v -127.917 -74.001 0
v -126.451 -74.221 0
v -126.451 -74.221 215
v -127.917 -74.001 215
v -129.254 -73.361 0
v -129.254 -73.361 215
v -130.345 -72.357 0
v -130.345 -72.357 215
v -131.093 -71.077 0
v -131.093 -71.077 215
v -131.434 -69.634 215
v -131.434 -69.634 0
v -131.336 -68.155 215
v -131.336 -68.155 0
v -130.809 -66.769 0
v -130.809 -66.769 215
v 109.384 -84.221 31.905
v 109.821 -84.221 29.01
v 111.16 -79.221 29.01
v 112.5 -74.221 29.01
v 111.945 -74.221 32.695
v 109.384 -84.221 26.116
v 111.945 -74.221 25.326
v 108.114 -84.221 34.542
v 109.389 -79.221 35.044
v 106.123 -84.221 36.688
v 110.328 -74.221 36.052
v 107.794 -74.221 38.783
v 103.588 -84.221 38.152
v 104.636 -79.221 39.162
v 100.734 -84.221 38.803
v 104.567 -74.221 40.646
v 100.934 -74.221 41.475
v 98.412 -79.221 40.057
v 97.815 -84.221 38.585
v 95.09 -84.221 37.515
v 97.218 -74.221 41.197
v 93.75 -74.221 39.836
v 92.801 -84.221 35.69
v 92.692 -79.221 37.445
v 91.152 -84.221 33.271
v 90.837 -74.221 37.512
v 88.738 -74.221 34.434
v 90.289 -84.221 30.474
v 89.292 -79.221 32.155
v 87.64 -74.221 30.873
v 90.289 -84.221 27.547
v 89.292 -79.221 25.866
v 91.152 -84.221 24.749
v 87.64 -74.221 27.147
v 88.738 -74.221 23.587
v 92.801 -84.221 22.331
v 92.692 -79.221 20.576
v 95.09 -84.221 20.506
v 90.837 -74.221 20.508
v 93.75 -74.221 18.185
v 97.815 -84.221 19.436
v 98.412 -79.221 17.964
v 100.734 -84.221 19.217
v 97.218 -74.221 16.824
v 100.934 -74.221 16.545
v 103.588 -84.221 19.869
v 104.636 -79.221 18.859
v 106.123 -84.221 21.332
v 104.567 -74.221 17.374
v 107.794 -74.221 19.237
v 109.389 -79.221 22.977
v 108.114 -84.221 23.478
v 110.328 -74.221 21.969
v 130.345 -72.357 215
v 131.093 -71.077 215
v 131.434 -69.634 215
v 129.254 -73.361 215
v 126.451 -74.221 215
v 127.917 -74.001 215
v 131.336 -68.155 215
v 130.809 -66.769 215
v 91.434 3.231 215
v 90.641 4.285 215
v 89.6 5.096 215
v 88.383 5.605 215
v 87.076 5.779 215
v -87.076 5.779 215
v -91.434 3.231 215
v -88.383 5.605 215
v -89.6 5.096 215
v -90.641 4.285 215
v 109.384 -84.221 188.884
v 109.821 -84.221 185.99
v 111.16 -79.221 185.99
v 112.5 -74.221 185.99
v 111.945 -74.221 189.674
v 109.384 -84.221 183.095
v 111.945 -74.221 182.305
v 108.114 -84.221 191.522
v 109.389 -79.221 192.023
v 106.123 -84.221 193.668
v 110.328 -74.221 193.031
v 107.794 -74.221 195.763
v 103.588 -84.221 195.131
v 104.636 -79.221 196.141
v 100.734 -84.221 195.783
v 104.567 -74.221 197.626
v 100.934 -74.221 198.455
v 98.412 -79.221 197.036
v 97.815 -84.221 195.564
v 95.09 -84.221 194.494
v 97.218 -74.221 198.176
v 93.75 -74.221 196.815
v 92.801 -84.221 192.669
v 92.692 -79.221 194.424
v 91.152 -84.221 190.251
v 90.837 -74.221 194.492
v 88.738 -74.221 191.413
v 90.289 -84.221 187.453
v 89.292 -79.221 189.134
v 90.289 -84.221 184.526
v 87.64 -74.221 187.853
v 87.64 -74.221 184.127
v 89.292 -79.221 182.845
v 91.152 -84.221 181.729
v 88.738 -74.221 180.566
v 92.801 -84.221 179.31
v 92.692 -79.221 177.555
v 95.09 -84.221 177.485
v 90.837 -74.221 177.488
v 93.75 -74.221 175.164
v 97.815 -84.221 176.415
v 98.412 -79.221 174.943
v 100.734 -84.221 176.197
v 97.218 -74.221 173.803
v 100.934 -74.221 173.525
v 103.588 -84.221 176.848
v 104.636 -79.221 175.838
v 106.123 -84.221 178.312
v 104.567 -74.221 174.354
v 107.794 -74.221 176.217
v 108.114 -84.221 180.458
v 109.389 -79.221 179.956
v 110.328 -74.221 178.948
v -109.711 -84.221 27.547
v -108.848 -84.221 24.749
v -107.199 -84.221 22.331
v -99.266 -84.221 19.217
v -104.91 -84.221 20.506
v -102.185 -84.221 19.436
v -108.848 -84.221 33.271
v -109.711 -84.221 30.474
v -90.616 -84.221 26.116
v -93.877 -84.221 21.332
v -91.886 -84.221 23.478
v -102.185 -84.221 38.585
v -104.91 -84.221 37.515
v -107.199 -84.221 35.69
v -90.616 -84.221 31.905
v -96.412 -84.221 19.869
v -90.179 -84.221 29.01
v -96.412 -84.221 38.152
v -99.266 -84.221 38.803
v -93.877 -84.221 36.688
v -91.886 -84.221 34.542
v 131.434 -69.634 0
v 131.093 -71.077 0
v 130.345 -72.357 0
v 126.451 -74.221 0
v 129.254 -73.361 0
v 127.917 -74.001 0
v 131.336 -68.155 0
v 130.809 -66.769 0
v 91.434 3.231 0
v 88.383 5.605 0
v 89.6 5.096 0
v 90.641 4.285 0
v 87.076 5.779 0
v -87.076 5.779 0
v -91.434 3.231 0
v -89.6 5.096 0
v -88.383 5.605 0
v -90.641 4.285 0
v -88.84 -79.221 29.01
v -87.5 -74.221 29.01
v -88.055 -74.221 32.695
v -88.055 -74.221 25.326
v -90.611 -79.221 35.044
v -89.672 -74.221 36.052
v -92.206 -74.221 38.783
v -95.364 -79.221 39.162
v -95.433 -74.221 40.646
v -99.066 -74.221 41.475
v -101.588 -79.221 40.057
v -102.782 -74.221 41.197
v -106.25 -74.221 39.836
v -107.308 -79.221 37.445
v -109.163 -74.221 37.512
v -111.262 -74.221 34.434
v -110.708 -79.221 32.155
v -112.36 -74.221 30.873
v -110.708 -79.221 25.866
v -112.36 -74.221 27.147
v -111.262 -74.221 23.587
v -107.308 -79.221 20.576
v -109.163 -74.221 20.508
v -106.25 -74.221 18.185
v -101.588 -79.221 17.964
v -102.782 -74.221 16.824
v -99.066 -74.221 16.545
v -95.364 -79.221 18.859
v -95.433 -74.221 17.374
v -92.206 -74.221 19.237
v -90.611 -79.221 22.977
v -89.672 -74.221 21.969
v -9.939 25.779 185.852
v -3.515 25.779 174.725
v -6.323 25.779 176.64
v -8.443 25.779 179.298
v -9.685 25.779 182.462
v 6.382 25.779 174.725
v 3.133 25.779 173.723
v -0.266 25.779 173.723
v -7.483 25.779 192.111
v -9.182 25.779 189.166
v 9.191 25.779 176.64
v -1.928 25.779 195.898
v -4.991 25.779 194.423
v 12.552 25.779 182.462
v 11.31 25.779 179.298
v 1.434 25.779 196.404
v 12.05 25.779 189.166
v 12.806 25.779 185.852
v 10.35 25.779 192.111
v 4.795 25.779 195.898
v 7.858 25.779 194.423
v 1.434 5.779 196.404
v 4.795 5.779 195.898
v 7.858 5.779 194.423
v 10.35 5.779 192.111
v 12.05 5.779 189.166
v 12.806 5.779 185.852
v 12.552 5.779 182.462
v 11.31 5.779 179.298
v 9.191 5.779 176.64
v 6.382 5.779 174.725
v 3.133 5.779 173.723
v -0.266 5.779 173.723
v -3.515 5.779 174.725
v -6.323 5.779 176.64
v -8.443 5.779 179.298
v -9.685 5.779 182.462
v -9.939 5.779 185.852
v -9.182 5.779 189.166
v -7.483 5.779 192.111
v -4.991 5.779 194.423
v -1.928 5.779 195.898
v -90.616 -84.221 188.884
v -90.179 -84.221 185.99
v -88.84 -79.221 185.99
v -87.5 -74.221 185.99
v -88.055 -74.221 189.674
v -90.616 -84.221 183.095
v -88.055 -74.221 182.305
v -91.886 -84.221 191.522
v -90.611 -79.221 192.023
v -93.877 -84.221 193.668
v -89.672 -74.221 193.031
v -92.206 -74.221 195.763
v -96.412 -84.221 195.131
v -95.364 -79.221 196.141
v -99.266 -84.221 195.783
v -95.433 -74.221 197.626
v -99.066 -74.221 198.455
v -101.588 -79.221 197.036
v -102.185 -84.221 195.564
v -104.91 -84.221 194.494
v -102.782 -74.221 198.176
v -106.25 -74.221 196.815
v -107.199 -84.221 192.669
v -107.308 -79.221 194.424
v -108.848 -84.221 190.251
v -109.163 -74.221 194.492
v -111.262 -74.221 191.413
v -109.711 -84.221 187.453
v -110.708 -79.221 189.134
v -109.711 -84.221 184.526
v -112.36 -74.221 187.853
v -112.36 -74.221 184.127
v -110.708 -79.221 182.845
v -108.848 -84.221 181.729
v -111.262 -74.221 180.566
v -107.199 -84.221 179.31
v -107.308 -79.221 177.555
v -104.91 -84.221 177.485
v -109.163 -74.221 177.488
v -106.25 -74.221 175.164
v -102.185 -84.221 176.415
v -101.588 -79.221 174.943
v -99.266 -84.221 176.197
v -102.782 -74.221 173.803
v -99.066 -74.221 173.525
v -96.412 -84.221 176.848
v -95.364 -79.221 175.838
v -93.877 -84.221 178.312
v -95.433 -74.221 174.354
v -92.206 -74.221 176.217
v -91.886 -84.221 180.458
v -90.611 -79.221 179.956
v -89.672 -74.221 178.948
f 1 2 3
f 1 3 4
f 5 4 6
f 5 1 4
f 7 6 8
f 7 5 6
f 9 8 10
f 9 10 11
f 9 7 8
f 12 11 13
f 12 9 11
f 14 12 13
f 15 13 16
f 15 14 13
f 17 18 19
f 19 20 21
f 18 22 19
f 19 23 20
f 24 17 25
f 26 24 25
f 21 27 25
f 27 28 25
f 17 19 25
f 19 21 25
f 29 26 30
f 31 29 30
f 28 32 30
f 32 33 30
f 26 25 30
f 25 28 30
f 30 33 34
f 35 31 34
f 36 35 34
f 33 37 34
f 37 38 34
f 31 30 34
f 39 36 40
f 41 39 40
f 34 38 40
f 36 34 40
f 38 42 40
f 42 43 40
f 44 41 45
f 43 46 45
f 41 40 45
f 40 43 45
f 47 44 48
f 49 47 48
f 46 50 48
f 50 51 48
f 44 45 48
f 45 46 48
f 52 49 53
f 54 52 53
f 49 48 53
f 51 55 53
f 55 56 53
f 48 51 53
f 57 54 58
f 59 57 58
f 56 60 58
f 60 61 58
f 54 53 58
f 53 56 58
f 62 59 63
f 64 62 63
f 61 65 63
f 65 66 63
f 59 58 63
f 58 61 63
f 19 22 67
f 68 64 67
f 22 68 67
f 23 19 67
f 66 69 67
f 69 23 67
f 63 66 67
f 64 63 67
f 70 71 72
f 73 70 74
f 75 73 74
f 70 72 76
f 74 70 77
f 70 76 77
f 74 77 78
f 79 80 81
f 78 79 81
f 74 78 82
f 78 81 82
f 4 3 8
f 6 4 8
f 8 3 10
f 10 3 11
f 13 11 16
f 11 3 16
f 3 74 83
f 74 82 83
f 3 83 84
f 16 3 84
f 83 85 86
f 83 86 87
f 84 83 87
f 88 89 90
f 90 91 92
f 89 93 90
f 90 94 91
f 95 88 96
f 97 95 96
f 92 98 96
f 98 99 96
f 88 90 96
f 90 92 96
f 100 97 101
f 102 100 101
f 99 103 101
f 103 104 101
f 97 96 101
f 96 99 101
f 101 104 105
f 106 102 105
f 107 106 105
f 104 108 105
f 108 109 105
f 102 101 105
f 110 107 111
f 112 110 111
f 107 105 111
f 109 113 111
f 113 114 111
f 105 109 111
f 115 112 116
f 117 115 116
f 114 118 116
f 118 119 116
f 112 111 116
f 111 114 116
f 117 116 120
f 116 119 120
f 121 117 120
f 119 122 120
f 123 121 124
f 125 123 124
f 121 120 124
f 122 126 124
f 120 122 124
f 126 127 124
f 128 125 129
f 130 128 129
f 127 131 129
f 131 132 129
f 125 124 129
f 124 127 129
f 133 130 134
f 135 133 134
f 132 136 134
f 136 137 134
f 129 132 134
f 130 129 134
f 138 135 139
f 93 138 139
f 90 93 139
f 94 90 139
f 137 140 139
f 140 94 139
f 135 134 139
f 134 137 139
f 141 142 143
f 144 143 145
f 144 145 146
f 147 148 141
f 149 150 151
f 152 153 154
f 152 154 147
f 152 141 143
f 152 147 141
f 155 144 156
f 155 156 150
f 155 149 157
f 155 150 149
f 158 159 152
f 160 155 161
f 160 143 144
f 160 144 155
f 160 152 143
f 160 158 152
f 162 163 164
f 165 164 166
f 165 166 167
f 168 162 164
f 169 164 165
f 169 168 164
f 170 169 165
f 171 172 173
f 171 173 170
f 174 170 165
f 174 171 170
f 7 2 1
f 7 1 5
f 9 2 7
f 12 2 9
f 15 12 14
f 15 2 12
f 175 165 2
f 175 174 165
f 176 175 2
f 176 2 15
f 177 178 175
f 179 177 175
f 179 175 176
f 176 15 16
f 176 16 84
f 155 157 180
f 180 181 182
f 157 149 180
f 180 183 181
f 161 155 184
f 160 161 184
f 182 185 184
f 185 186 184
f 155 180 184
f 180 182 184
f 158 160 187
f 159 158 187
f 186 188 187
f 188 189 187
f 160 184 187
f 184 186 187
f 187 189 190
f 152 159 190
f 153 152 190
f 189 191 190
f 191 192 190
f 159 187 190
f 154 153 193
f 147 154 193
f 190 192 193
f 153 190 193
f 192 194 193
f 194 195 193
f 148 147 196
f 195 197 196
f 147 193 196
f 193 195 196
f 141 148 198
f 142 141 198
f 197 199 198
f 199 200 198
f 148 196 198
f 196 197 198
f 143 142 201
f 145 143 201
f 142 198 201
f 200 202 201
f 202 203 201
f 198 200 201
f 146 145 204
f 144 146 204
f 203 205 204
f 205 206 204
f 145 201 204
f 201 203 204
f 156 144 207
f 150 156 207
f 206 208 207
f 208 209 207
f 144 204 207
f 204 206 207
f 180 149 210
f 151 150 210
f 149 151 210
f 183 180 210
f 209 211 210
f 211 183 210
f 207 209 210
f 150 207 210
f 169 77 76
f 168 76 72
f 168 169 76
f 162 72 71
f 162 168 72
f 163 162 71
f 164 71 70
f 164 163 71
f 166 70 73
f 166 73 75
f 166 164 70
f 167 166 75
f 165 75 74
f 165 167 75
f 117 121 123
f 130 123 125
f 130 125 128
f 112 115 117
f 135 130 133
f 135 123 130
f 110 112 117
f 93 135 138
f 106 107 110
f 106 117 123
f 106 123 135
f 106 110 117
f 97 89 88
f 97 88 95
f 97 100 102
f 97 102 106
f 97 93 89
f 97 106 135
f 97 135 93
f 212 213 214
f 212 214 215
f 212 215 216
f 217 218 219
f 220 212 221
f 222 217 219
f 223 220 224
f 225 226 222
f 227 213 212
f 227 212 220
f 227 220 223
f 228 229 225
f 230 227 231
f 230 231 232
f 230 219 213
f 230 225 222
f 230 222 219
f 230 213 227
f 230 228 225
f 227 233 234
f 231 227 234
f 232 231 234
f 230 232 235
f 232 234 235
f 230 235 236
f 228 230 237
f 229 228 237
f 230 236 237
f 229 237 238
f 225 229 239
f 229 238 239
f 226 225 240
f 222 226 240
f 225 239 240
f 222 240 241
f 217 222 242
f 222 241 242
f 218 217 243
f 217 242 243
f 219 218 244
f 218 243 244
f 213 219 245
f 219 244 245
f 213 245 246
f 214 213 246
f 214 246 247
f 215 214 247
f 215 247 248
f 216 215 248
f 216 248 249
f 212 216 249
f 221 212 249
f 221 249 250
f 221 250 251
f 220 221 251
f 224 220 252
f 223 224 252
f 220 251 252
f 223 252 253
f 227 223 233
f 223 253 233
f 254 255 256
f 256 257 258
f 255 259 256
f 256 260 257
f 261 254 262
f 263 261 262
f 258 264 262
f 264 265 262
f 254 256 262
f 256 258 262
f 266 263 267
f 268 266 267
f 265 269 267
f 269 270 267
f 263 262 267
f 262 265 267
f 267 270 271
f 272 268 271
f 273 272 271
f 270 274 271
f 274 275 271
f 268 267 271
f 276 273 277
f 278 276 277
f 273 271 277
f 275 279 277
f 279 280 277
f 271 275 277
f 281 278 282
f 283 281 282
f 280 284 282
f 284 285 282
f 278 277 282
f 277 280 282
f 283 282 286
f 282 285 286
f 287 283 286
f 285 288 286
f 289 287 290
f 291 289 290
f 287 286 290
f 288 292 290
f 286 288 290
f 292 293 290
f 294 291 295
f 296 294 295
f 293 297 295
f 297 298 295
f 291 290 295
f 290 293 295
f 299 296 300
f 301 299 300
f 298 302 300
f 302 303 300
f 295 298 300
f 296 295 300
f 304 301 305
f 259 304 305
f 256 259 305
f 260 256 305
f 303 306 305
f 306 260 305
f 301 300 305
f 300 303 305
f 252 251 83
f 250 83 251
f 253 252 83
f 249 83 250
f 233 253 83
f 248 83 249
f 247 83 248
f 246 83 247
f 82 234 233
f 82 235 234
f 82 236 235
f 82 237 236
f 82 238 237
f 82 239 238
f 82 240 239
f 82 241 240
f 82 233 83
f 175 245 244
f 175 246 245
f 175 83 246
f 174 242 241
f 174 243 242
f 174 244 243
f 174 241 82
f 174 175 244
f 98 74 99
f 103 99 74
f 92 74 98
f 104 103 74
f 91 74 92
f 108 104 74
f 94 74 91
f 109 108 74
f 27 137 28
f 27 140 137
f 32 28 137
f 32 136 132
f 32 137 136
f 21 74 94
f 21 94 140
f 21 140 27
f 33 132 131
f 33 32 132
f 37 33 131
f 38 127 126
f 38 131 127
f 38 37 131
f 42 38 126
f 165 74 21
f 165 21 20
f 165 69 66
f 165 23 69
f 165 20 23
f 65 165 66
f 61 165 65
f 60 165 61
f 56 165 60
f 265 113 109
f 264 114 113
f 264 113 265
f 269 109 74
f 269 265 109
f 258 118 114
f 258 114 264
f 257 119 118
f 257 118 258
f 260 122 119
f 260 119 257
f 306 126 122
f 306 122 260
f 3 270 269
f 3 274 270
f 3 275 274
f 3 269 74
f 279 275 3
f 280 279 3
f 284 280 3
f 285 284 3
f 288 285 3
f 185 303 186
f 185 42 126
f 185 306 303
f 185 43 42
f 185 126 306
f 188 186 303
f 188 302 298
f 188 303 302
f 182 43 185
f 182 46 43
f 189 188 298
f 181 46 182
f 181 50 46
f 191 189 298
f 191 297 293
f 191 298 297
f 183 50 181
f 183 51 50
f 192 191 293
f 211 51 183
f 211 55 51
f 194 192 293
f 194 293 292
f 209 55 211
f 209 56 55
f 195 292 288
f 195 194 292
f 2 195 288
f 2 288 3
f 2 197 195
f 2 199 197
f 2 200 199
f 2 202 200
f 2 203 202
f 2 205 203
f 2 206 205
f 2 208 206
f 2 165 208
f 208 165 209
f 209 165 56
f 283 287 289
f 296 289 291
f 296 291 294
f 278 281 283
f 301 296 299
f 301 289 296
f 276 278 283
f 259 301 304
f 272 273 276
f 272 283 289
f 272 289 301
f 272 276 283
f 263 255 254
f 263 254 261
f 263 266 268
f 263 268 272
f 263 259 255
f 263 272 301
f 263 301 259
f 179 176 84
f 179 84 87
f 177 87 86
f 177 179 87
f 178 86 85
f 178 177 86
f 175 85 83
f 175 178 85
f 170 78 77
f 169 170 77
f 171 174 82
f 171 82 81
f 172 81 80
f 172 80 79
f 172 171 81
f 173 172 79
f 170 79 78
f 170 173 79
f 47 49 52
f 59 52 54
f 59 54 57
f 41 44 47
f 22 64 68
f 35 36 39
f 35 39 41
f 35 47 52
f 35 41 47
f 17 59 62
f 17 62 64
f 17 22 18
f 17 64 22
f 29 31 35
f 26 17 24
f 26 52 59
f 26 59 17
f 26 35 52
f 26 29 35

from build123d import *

# Parameters (mm, degrees)
EXTRUDE_1_DEPTH           = 215
SKETCH_2_R                = 12.5
EXTRUDE_2_DEPTH           = 10
EXTRUDE_2_DRAFT           = 15
EXTRUDE_2_PROFILE_2_DEPTH = 10
EXTRUDE_2_PROFILE_2_DRAFT = 15
EXTRUDE_2_PROFILE_3_DEPTH = 10
EXTRUDE_2_PROFILE_3_DRAFT = 15
EXTRUDE_2_PROFILE_4_DEPTH = 10
EXTRUDE_2_PROFILE_4_DRAFT = 15
SKETCH1_R                 = 11.40437452
BOSS_EXTRUDE1_DEPTH       = 20


with BuildPart() as part:
    # 草圖1 → 填料-伸長1 (new body)
    with BuildSketch(Plane.XY):
        with BuildLine():
            Line((-130.808640264, -66.769197125), (-91.433640264, 3.230802875))
            ThreePointArc((-91.433640264, 3.230802875), (-89.599992065, 5.095544116), (-87.075762578, 5.779496677))
            Line((-87.075762578, 5.779496677), (87.075762578, 5.779496677))
            ThreePointArc((87.075762578, 5.779496677), (89.599992065, 5.095544116), (91.433640264, 3.230802875))
            Line((91.433640264, 3.230802875), (130.808640264, -66.769197125))
            ThreePointArc((130.808640264, -66.769197125), (130.766810017, -71.74473281), (126.450762578, -74.220503323))
            Line((126.450762578, -74.220503323), (-126.450762578, -74.220503323))
            ThreePointArc((-126.450762578, -74.220503323), (-130.766810017, -71.74473281), (-130.808640264, -66.769197125))
        make_face()
    extrude(amount=EXTRUDE_1_DEPTH)


with BuildPart() as extrude_2_tool:
    # 草圖2 → 填料-伸長2 (with draft: the straight prism first)
    with BuildSketch(Plane.XZ.offset(74.220503323)):
        with Locations((-100, 185.989670211)):
            Circle(SKETCH_2_R)
    extrude(amount=EXTRUDE_2_DEPTH)
    # 填料-伸長2: the draft: its side faces are tilted about the plane it starts from
    extrude_2_sides = [extrude_2_tool.faces().sort_by_distance(p)[0] for p in [
        (-112.5, -79.220503323, 185.989670211),
    ]]
    draft(extrude_2_sides, Plane.XZ.offset(74.220503323), EXTRUDE_2_DRAFT)


with BuildPart() as part_1:
    add(part.part)

    # 填料-伸長2: add extrude_2_tool
    add(extrude_2_tool.part)


with BuildPart() as extrude_2_profile_2_tool:
    # 草圖2 → 填料-伸長2 profile 2 (with draft: the straight prism first)
    with BuildSketch(Plane.XZ.offset(74.220503323)):
        with Locations((-100, 29.010329789)):
            Circle(SKETCH_2_R)
    extrude(amount=EXTRUDE_2_PROFILE_2_DEPTH)
    # 填料-伸長2 profile 2: the draft: its side faces are tilted about the plane it starts from
    extrude_2_profile_2_sides = [extrude_2_profile_2_tool.faces().sort_by_distance(p)[0] for p in [
        (-112.5, -79.220503323, 29.010329789),
    ]]
    draft(extrude_2_profile_2_sides, Plane.XZ.offset(74.220503323), EXTRUDE_2_PROFILE_2_DRAFT)


with BuildPart() as part_2:
    add(part_1.part)

    # 填料-伸長2 profile 2: add extrude_2_profile_2_tool
    add(extrude_2_profile_2_tool.part)


with BuildPart() as extrude_2_profile_3_tool:
    # 草圖2 → 填料-伸長2 profile 3 (with draft: the straight prism first)
    with BuildSketch(Plane.XZ.offset(74.220503323)):
        with Locations((100, 29.010329789)):
            Circle(SKETCH_2_R)
    extrude(amount=EXTRUDE_2_PROFILE_3_DEPTH)
    # 填料-伸長2 profile 3: the draft: its side faces are tilted about the plane it starts from
    extrude_2_profile_3_sides = [extrude_2_profile_3_tool.faces().sort_by_distance(p)[0] for p in [
        (87.5, -79.220503323, 29.010329789),
    ]]
    draft(extrude_2_profile_3_sides, Plane.XZ.offset(74.220503323), EXTRUDE_2_PROFILE_3_DRAFT)


with BuildPart() as part_3:
    add(part_2.part)

    # 填料-伸長2 profile 3: add extrude_2_profile_3_tool
    add(extrude_2_profile_3_tool.part)


with BuildPart() as extrude_2_profile_4_tool:
    # 草圖2 → 填料-伸長2 profile 4 (with draft: the straight prism first)
    with BuildSketch(Plane.XZ.offset(74.220503323)):
        with Locations((100, 185.989670211)):
            Circle(SKETCH_2_R)
    extrude(amount=EXTRUDE_2_PROFILE_4_DEPTH)
    # 填料-伸長2 profile 4: the draft: its side faces are tilted about the plane it starts from
    extrude_2_profile_4_sides = [extrude_2_profile_4_tool.faces().sort_by_distance(p)[0] for p in [
        (87.5, -79.220503323, 185.989670211),
    ]]
    draft(extrude_2_profile_4_sides, Plane.XZ.offset(74.220503323), EXTRUDE_2_PROFILE_4_DRAFT)


with BuildPart() as part_4:
    add(part_3.part)

    # 填料-伸長2 profile 4: add extrude_2_profile_4_tool
    add(extrude_2_profile_4_tool.part)

    # Sketch1 → Boss-Extrude1 (add)
    with BuildSketch(Plane(origin=(0, 5.779496677, 0), x_dir=(1, 0, 0), z_dir=(0, 1, 0))):
        with Locations(Location((1.433640264, -185, 0), (0, 0, 270))):
            Circle(SKETCH1_R)
    extrude(amount=BOSS_EXTRUDE1_DEPTH)


solid = part_4.part
